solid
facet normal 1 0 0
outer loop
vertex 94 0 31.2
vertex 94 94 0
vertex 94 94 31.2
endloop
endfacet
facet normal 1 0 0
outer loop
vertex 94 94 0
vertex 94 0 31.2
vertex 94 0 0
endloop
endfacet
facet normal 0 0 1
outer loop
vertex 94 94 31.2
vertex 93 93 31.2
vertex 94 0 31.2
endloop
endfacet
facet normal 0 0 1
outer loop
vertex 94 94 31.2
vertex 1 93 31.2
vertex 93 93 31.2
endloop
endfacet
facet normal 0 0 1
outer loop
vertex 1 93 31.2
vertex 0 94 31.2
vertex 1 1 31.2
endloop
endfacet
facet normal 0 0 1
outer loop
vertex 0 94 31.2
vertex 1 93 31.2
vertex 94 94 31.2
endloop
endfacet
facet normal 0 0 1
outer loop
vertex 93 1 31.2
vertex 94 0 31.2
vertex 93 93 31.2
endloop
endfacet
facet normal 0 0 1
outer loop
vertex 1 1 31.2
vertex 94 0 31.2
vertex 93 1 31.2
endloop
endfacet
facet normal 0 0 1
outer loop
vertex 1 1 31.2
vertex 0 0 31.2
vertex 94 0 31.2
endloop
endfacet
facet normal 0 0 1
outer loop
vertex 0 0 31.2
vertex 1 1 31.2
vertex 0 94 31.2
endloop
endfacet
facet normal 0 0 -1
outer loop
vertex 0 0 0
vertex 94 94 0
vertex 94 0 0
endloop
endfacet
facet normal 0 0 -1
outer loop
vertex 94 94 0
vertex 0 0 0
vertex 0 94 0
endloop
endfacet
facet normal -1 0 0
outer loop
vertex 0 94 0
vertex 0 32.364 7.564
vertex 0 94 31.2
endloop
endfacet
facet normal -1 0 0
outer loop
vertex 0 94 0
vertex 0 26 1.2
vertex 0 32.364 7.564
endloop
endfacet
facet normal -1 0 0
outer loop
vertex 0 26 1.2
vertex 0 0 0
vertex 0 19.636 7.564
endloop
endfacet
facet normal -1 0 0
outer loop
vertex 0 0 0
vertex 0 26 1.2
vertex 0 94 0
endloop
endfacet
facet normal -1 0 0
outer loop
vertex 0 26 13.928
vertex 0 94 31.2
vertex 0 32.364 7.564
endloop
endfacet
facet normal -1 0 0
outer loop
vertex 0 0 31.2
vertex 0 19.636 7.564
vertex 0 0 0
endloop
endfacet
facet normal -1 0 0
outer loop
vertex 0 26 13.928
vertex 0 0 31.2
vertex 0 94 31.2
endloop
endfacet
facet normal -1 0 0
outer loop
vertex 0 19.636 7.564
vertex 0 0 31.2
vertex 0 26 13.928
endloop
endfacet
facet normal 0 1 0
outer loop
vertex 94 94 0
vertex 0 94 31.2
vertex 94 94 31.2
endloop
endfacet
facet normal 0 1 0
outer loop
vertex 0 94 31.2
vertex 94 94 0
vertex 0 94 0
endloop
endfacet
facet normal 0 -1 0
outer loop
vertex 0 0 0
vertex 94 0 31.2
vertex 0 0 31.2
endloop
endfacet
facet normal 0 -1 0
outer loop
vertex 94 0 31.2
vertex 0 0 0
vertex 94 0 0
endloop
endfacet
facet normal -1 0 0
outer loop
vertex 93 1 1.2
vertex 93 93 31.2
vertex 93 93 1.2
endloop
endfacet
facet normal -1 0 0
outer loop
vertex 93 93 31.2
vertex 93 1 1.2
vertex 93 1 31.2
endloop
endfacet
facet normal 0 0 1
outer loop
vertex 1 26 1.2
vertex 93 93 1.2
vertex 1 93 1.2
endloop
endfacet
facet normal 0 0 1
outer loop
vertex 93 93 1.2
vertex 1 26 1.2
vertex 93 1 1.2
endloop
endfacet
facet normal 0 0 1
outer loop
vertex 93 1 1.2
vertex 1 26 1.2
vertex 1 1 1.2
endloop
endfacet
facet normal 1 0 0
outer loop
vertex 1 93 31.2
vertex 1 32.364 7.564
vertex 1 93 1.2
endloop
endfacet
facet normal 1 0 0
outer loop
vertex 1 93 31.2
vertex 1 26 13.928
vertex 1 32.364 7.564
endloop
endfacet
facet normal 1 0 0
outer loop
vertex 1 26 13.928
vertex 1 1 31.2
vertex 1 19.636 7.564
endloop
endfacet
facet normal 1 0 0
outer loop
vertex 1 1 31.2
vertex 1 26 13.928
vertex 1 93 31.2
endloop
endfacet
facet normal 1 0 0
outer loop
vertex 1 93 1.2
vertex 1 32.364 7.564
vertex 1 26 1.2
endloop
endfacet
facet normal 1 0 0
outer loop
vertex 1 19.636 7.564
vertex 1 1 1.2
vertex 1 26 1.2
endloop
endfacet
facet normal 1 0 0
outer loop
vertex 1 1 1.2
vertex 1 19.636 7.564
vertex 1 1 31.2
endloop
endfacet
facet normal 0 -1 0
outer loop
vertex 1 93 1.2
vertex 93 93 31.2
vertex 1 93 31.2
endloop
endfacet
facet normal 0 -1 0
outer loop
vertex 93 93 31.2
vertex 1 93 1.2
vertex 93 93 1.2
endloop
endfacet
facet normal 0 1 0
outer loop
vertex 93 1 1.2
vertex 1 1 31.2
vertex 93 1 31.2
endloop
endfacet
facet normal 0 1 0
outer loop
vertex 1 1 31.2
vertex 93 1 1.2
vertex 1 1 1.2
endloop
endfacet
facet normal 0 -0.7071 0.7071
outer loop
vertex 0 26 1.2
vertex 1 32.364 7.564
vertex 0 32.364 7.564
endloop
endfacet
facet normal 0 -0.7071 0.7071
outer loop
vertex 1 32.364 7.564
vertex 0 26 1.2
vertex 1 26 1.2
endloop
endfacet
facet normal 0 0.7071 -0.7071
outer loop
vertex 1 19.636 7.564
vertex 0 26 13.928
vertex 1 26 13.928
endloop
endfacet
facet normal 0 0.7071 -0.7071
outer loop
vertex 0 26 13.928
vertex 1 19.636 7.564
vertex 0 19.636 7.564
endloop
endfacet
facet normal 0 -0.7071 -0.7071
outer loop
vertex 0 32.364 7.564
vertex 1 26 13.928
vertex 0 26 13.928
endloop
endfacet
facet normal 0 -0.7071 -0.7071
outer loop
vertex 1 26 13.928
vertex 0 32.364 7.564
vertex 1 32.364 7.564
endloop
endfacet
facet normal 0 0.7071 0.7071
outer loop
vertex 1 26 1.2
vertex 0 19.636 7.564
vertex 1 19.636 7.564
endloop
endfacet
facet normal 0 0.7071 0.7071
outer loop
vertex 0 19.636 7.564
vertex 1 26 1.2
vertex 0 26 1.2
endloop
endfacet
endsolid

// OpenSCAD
floor = .2*6;
wall = 1;
height = 30;

difference() {
	cube([
		92 + wall*2,
		92 + wall*2,
		floor + height
	]);

	translate([
		wall,
		wall,
		floor
	]) {
		cube([
			92,
			92,
			height + 1
		]);
	}

	translate([
		-1,
		wall+25,
		floor
	]) {
		rotate([
			45,
			0,
			0
		]) {
			cube([
				2 + wall,
				9,
				9
			]);
		}
	}
}
